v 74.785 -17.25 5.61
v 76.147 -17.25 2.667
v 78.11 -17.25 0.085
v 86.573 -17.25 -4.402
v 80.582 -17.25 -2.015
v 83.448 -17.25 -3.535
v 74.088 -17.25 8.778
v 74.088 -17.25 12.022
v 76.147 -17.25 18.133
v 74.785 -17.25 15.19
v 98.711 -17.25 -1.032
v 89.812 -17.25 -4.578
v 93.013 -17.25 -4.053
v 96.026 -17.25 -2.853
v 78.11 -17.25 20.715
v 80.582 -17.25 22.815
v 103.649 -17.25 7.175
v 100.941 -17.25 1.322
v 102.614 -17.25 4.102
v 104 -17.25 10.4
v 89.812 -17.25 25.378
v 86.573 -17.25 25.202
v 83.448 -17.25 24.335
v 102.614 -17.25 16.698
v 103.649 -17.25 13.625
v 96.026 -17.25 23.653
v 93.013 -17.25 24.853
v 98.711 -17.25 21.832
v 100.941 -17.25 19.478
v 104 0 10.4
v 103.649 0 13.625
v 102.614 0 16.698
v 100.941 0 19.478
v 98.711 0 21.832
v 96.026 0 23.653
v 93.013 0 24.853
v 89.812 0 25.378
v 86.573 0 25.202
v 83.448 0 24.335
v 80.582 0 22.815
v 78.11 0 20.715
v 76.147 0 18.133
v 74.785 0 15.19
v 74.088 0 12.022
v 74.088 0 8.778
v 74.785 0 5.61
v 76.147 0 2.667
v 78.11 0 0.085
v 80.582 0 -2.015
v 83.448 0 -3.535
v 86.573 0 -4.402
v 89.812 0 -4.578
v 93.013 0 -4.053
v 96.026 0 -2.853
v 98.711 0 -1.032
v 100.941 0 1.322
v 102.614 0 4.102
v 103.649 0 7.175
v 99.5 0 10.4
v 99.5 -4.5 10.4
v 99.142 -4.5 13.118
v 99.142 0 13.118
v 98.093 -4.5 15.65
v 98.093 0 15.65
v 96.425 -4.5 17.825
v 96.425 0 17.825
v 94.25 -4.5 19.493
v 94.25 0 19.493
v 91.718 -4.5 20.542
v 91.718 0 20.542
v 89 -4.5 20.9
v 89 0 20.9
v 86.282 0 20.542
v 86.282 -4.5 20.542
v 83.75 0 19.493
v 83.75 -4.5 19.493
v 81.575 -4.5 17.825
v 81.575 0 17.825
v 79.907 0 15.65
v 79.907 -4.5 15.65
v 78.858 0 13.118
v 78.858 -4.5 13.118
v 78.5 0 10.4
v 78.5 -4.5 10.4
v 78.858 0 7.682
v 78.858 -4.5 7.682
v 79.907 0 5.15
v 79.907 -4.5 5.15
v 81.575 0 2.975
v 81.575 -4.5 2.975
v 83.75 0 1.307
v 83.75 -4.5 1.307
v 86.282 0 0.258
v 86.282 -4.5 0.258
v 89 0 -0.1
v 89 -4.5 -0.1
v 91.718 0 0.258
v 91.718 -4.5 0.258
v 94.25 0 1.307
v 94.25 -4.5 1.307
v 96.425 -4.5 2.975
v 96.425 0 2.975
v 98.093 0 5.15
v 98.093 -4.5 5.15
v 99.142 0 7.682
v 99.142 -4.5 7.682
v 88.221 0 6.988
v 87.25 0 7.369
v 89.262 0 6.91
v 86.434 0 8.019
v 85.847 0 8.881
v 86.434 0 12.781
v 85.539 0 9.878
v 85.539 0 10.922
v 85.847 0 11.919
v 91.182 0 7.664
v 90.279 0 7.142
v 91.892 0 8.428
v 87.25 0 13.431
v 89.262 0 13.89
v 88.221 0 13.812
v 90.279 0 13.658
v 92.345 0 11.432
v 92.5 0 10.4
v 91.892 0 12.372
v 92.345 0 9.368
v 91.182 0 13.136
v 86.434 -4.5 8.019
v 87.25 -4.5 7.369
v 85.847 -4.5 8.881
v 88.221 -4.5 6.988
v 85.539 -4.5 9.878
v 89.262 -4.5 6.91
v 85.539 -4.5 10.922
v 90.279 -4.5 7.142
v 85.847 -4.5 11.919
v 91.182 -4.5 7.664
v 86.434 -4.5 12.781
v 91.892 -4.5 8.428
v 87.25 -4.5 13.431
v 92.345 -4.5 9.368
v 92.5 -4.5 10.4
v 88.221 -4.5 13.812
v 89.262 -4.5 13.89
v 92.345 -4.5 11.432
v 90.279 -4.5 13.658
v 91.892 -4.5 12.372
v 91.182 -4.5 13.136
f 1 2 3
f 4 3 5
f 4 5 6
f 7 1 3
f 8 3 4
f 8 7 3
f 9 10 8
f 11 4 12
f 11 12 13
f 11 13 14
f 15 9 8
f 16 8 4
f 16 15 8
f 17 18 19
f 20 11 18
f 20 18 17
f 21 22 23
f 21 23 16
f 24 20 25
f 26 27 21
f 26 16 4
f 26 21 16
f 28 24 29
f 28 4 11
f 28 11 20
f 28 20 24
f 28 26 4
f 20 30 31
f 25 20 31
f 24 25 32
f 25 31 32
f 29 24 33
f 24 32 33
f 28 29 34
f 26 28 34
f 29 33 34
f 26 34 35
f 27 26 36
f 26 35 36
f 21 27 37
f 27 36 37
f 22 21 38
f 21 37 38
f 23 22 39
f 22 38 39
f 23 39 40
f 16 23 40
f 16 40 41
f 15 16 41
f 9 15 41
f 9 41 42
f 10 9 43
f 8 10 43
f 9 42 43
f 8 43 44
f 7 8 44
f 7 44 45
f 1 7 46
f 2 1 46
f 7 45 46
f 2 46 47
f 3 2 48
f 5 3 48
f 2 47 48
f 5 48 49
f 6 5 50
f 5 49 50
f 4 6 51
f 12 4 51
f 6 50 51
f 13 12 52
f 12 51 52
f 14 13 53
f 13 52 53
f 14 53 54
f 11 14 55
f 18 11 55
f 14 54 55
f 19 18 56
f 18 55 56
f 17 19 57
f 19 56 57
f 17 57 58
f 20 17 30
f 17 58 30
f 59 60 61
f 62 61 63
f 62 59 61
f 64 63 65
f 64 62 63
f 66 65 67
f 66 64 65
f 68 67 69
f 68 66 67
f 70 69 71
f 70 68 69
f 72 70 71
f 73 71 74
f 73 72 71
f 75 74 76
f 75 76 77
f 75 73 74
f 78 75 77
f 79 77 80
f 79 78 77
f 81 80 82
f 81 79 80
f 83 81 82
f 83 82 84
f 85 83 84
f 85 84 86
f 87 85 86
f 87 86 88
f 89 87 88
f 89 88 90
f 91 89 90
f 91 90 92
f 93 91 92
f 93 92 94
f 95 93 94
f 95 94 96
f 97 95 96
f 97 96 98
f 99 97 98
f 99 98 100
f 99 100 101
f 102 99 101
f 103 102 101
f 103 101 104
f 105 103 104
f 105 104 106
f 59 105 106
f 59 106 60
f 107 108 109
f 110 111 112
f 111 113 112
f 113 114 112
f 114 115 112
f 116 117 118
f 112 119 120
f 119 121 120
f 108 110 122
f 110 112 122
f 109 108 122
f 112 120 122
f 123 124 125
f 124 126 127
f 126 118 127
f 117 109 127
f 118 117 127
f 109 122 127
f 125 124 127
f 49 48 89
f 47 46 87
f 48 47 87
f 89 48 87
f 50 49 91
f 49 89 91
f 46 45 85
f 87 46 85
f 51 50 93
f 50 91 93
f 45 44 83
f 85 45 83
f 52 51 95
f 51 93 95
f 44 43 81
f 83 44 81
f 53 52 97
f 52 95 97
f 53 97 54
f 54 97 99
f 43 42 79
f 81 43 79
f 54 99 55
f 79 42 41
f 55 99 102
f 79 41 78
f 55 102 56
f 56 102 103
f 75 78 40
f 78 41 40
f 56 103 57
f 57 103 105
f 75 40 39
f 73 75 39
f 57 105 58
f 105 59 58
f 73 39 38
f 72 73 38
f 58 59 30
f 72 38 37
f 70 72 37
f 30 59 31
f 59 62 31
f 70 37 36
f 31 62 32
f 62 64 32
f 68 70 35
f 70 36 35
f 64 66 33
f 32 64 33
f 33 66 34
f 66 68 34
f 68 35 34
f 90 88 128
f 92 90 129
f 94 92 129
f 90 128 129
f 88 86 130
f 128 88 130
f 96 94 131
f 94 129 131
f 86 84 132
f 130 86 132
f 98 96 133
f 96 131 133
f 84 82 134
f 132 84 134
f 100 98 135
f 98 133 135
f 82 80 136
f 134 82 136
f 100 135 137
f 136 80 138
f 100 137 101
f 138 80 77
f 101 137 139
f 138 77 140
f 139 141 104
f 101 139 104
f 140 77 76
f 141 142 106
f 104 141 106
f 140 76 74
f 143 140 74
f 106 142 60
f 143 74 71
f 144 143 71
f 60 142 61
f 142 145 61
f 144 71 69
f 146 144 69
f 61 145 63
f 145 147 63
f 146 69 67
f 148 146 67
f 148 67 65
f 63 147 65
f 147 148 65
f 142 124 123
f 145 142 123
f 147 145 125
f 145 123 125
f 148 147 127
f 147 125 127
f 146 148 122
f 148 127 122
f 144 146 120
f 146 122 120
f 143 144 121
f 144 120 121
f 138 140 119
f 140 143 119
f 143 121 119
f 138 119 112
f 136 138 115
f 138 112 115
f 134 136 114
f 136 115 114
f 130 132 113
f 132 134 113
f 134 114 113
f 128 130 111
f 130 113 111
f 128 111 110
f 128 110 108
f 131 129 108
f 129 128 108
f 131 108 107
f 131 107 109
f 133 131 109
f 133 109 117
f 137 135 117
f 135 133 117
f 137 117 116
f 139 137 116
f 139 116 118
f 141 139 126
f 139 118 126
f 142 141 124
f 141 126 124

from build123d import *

# Parameters (mm, degrees)
CYLINDER003_R             = 3.5
CYLINDER003_DEPTH         = 10
CYLINDER002_R             = 10.5
CYLINDER002_DEPTH         = 5
CUT005007_PLACEMENT_ANGLE = 90
SKETCH005_R               = 15
EXTRUDE003002_DEPTH       = 17.25


with BuildPart() as cylinder003:
    # Cylinder003 → Cylinder003 (new body)
    with BuildSketch(Plane.XY.offset(-3)):
        Circle(CYLINDER003_R)
    extrude(amount=CYLINDER003_DEPTH)


with BuildPart() as iman001:
    # Cylinder002 → Cylinder002 (new body)
    with BuildSketch(Plane.XY):
        Circle(CYLINDER002_R)
    extrude(amount=CYLINDER002_DEPTH)

    # Cut005007: cut Cylinder003
    add(cylinder003.part, mode=Mode.SUBTRACT)


with BuildPart() as iman001_1:
    # Cut005007 placement: moved
    add(iman001.part.moved(Location((89, 0.5, 10.4))).rotate(Axis((89, 0.5, 10.4), (1, 0, 0)), CUT005007_PLACEMENT_ANGLE))


with BuildPart() as cut005008:
    # Sketch005 → Extrude003002 (new body)
    with BuildSketch(Plane.XZ):
        with Locations((89, 10.4)):
            Circle(SKETCH005_R)
    extrude(amount=EXTRUDE003002_DEPTH)

    # Cut005008: cut iman001
    add(iman001_1.part, mode=Mode.SUBTRACT)


solid = cut005008.part
